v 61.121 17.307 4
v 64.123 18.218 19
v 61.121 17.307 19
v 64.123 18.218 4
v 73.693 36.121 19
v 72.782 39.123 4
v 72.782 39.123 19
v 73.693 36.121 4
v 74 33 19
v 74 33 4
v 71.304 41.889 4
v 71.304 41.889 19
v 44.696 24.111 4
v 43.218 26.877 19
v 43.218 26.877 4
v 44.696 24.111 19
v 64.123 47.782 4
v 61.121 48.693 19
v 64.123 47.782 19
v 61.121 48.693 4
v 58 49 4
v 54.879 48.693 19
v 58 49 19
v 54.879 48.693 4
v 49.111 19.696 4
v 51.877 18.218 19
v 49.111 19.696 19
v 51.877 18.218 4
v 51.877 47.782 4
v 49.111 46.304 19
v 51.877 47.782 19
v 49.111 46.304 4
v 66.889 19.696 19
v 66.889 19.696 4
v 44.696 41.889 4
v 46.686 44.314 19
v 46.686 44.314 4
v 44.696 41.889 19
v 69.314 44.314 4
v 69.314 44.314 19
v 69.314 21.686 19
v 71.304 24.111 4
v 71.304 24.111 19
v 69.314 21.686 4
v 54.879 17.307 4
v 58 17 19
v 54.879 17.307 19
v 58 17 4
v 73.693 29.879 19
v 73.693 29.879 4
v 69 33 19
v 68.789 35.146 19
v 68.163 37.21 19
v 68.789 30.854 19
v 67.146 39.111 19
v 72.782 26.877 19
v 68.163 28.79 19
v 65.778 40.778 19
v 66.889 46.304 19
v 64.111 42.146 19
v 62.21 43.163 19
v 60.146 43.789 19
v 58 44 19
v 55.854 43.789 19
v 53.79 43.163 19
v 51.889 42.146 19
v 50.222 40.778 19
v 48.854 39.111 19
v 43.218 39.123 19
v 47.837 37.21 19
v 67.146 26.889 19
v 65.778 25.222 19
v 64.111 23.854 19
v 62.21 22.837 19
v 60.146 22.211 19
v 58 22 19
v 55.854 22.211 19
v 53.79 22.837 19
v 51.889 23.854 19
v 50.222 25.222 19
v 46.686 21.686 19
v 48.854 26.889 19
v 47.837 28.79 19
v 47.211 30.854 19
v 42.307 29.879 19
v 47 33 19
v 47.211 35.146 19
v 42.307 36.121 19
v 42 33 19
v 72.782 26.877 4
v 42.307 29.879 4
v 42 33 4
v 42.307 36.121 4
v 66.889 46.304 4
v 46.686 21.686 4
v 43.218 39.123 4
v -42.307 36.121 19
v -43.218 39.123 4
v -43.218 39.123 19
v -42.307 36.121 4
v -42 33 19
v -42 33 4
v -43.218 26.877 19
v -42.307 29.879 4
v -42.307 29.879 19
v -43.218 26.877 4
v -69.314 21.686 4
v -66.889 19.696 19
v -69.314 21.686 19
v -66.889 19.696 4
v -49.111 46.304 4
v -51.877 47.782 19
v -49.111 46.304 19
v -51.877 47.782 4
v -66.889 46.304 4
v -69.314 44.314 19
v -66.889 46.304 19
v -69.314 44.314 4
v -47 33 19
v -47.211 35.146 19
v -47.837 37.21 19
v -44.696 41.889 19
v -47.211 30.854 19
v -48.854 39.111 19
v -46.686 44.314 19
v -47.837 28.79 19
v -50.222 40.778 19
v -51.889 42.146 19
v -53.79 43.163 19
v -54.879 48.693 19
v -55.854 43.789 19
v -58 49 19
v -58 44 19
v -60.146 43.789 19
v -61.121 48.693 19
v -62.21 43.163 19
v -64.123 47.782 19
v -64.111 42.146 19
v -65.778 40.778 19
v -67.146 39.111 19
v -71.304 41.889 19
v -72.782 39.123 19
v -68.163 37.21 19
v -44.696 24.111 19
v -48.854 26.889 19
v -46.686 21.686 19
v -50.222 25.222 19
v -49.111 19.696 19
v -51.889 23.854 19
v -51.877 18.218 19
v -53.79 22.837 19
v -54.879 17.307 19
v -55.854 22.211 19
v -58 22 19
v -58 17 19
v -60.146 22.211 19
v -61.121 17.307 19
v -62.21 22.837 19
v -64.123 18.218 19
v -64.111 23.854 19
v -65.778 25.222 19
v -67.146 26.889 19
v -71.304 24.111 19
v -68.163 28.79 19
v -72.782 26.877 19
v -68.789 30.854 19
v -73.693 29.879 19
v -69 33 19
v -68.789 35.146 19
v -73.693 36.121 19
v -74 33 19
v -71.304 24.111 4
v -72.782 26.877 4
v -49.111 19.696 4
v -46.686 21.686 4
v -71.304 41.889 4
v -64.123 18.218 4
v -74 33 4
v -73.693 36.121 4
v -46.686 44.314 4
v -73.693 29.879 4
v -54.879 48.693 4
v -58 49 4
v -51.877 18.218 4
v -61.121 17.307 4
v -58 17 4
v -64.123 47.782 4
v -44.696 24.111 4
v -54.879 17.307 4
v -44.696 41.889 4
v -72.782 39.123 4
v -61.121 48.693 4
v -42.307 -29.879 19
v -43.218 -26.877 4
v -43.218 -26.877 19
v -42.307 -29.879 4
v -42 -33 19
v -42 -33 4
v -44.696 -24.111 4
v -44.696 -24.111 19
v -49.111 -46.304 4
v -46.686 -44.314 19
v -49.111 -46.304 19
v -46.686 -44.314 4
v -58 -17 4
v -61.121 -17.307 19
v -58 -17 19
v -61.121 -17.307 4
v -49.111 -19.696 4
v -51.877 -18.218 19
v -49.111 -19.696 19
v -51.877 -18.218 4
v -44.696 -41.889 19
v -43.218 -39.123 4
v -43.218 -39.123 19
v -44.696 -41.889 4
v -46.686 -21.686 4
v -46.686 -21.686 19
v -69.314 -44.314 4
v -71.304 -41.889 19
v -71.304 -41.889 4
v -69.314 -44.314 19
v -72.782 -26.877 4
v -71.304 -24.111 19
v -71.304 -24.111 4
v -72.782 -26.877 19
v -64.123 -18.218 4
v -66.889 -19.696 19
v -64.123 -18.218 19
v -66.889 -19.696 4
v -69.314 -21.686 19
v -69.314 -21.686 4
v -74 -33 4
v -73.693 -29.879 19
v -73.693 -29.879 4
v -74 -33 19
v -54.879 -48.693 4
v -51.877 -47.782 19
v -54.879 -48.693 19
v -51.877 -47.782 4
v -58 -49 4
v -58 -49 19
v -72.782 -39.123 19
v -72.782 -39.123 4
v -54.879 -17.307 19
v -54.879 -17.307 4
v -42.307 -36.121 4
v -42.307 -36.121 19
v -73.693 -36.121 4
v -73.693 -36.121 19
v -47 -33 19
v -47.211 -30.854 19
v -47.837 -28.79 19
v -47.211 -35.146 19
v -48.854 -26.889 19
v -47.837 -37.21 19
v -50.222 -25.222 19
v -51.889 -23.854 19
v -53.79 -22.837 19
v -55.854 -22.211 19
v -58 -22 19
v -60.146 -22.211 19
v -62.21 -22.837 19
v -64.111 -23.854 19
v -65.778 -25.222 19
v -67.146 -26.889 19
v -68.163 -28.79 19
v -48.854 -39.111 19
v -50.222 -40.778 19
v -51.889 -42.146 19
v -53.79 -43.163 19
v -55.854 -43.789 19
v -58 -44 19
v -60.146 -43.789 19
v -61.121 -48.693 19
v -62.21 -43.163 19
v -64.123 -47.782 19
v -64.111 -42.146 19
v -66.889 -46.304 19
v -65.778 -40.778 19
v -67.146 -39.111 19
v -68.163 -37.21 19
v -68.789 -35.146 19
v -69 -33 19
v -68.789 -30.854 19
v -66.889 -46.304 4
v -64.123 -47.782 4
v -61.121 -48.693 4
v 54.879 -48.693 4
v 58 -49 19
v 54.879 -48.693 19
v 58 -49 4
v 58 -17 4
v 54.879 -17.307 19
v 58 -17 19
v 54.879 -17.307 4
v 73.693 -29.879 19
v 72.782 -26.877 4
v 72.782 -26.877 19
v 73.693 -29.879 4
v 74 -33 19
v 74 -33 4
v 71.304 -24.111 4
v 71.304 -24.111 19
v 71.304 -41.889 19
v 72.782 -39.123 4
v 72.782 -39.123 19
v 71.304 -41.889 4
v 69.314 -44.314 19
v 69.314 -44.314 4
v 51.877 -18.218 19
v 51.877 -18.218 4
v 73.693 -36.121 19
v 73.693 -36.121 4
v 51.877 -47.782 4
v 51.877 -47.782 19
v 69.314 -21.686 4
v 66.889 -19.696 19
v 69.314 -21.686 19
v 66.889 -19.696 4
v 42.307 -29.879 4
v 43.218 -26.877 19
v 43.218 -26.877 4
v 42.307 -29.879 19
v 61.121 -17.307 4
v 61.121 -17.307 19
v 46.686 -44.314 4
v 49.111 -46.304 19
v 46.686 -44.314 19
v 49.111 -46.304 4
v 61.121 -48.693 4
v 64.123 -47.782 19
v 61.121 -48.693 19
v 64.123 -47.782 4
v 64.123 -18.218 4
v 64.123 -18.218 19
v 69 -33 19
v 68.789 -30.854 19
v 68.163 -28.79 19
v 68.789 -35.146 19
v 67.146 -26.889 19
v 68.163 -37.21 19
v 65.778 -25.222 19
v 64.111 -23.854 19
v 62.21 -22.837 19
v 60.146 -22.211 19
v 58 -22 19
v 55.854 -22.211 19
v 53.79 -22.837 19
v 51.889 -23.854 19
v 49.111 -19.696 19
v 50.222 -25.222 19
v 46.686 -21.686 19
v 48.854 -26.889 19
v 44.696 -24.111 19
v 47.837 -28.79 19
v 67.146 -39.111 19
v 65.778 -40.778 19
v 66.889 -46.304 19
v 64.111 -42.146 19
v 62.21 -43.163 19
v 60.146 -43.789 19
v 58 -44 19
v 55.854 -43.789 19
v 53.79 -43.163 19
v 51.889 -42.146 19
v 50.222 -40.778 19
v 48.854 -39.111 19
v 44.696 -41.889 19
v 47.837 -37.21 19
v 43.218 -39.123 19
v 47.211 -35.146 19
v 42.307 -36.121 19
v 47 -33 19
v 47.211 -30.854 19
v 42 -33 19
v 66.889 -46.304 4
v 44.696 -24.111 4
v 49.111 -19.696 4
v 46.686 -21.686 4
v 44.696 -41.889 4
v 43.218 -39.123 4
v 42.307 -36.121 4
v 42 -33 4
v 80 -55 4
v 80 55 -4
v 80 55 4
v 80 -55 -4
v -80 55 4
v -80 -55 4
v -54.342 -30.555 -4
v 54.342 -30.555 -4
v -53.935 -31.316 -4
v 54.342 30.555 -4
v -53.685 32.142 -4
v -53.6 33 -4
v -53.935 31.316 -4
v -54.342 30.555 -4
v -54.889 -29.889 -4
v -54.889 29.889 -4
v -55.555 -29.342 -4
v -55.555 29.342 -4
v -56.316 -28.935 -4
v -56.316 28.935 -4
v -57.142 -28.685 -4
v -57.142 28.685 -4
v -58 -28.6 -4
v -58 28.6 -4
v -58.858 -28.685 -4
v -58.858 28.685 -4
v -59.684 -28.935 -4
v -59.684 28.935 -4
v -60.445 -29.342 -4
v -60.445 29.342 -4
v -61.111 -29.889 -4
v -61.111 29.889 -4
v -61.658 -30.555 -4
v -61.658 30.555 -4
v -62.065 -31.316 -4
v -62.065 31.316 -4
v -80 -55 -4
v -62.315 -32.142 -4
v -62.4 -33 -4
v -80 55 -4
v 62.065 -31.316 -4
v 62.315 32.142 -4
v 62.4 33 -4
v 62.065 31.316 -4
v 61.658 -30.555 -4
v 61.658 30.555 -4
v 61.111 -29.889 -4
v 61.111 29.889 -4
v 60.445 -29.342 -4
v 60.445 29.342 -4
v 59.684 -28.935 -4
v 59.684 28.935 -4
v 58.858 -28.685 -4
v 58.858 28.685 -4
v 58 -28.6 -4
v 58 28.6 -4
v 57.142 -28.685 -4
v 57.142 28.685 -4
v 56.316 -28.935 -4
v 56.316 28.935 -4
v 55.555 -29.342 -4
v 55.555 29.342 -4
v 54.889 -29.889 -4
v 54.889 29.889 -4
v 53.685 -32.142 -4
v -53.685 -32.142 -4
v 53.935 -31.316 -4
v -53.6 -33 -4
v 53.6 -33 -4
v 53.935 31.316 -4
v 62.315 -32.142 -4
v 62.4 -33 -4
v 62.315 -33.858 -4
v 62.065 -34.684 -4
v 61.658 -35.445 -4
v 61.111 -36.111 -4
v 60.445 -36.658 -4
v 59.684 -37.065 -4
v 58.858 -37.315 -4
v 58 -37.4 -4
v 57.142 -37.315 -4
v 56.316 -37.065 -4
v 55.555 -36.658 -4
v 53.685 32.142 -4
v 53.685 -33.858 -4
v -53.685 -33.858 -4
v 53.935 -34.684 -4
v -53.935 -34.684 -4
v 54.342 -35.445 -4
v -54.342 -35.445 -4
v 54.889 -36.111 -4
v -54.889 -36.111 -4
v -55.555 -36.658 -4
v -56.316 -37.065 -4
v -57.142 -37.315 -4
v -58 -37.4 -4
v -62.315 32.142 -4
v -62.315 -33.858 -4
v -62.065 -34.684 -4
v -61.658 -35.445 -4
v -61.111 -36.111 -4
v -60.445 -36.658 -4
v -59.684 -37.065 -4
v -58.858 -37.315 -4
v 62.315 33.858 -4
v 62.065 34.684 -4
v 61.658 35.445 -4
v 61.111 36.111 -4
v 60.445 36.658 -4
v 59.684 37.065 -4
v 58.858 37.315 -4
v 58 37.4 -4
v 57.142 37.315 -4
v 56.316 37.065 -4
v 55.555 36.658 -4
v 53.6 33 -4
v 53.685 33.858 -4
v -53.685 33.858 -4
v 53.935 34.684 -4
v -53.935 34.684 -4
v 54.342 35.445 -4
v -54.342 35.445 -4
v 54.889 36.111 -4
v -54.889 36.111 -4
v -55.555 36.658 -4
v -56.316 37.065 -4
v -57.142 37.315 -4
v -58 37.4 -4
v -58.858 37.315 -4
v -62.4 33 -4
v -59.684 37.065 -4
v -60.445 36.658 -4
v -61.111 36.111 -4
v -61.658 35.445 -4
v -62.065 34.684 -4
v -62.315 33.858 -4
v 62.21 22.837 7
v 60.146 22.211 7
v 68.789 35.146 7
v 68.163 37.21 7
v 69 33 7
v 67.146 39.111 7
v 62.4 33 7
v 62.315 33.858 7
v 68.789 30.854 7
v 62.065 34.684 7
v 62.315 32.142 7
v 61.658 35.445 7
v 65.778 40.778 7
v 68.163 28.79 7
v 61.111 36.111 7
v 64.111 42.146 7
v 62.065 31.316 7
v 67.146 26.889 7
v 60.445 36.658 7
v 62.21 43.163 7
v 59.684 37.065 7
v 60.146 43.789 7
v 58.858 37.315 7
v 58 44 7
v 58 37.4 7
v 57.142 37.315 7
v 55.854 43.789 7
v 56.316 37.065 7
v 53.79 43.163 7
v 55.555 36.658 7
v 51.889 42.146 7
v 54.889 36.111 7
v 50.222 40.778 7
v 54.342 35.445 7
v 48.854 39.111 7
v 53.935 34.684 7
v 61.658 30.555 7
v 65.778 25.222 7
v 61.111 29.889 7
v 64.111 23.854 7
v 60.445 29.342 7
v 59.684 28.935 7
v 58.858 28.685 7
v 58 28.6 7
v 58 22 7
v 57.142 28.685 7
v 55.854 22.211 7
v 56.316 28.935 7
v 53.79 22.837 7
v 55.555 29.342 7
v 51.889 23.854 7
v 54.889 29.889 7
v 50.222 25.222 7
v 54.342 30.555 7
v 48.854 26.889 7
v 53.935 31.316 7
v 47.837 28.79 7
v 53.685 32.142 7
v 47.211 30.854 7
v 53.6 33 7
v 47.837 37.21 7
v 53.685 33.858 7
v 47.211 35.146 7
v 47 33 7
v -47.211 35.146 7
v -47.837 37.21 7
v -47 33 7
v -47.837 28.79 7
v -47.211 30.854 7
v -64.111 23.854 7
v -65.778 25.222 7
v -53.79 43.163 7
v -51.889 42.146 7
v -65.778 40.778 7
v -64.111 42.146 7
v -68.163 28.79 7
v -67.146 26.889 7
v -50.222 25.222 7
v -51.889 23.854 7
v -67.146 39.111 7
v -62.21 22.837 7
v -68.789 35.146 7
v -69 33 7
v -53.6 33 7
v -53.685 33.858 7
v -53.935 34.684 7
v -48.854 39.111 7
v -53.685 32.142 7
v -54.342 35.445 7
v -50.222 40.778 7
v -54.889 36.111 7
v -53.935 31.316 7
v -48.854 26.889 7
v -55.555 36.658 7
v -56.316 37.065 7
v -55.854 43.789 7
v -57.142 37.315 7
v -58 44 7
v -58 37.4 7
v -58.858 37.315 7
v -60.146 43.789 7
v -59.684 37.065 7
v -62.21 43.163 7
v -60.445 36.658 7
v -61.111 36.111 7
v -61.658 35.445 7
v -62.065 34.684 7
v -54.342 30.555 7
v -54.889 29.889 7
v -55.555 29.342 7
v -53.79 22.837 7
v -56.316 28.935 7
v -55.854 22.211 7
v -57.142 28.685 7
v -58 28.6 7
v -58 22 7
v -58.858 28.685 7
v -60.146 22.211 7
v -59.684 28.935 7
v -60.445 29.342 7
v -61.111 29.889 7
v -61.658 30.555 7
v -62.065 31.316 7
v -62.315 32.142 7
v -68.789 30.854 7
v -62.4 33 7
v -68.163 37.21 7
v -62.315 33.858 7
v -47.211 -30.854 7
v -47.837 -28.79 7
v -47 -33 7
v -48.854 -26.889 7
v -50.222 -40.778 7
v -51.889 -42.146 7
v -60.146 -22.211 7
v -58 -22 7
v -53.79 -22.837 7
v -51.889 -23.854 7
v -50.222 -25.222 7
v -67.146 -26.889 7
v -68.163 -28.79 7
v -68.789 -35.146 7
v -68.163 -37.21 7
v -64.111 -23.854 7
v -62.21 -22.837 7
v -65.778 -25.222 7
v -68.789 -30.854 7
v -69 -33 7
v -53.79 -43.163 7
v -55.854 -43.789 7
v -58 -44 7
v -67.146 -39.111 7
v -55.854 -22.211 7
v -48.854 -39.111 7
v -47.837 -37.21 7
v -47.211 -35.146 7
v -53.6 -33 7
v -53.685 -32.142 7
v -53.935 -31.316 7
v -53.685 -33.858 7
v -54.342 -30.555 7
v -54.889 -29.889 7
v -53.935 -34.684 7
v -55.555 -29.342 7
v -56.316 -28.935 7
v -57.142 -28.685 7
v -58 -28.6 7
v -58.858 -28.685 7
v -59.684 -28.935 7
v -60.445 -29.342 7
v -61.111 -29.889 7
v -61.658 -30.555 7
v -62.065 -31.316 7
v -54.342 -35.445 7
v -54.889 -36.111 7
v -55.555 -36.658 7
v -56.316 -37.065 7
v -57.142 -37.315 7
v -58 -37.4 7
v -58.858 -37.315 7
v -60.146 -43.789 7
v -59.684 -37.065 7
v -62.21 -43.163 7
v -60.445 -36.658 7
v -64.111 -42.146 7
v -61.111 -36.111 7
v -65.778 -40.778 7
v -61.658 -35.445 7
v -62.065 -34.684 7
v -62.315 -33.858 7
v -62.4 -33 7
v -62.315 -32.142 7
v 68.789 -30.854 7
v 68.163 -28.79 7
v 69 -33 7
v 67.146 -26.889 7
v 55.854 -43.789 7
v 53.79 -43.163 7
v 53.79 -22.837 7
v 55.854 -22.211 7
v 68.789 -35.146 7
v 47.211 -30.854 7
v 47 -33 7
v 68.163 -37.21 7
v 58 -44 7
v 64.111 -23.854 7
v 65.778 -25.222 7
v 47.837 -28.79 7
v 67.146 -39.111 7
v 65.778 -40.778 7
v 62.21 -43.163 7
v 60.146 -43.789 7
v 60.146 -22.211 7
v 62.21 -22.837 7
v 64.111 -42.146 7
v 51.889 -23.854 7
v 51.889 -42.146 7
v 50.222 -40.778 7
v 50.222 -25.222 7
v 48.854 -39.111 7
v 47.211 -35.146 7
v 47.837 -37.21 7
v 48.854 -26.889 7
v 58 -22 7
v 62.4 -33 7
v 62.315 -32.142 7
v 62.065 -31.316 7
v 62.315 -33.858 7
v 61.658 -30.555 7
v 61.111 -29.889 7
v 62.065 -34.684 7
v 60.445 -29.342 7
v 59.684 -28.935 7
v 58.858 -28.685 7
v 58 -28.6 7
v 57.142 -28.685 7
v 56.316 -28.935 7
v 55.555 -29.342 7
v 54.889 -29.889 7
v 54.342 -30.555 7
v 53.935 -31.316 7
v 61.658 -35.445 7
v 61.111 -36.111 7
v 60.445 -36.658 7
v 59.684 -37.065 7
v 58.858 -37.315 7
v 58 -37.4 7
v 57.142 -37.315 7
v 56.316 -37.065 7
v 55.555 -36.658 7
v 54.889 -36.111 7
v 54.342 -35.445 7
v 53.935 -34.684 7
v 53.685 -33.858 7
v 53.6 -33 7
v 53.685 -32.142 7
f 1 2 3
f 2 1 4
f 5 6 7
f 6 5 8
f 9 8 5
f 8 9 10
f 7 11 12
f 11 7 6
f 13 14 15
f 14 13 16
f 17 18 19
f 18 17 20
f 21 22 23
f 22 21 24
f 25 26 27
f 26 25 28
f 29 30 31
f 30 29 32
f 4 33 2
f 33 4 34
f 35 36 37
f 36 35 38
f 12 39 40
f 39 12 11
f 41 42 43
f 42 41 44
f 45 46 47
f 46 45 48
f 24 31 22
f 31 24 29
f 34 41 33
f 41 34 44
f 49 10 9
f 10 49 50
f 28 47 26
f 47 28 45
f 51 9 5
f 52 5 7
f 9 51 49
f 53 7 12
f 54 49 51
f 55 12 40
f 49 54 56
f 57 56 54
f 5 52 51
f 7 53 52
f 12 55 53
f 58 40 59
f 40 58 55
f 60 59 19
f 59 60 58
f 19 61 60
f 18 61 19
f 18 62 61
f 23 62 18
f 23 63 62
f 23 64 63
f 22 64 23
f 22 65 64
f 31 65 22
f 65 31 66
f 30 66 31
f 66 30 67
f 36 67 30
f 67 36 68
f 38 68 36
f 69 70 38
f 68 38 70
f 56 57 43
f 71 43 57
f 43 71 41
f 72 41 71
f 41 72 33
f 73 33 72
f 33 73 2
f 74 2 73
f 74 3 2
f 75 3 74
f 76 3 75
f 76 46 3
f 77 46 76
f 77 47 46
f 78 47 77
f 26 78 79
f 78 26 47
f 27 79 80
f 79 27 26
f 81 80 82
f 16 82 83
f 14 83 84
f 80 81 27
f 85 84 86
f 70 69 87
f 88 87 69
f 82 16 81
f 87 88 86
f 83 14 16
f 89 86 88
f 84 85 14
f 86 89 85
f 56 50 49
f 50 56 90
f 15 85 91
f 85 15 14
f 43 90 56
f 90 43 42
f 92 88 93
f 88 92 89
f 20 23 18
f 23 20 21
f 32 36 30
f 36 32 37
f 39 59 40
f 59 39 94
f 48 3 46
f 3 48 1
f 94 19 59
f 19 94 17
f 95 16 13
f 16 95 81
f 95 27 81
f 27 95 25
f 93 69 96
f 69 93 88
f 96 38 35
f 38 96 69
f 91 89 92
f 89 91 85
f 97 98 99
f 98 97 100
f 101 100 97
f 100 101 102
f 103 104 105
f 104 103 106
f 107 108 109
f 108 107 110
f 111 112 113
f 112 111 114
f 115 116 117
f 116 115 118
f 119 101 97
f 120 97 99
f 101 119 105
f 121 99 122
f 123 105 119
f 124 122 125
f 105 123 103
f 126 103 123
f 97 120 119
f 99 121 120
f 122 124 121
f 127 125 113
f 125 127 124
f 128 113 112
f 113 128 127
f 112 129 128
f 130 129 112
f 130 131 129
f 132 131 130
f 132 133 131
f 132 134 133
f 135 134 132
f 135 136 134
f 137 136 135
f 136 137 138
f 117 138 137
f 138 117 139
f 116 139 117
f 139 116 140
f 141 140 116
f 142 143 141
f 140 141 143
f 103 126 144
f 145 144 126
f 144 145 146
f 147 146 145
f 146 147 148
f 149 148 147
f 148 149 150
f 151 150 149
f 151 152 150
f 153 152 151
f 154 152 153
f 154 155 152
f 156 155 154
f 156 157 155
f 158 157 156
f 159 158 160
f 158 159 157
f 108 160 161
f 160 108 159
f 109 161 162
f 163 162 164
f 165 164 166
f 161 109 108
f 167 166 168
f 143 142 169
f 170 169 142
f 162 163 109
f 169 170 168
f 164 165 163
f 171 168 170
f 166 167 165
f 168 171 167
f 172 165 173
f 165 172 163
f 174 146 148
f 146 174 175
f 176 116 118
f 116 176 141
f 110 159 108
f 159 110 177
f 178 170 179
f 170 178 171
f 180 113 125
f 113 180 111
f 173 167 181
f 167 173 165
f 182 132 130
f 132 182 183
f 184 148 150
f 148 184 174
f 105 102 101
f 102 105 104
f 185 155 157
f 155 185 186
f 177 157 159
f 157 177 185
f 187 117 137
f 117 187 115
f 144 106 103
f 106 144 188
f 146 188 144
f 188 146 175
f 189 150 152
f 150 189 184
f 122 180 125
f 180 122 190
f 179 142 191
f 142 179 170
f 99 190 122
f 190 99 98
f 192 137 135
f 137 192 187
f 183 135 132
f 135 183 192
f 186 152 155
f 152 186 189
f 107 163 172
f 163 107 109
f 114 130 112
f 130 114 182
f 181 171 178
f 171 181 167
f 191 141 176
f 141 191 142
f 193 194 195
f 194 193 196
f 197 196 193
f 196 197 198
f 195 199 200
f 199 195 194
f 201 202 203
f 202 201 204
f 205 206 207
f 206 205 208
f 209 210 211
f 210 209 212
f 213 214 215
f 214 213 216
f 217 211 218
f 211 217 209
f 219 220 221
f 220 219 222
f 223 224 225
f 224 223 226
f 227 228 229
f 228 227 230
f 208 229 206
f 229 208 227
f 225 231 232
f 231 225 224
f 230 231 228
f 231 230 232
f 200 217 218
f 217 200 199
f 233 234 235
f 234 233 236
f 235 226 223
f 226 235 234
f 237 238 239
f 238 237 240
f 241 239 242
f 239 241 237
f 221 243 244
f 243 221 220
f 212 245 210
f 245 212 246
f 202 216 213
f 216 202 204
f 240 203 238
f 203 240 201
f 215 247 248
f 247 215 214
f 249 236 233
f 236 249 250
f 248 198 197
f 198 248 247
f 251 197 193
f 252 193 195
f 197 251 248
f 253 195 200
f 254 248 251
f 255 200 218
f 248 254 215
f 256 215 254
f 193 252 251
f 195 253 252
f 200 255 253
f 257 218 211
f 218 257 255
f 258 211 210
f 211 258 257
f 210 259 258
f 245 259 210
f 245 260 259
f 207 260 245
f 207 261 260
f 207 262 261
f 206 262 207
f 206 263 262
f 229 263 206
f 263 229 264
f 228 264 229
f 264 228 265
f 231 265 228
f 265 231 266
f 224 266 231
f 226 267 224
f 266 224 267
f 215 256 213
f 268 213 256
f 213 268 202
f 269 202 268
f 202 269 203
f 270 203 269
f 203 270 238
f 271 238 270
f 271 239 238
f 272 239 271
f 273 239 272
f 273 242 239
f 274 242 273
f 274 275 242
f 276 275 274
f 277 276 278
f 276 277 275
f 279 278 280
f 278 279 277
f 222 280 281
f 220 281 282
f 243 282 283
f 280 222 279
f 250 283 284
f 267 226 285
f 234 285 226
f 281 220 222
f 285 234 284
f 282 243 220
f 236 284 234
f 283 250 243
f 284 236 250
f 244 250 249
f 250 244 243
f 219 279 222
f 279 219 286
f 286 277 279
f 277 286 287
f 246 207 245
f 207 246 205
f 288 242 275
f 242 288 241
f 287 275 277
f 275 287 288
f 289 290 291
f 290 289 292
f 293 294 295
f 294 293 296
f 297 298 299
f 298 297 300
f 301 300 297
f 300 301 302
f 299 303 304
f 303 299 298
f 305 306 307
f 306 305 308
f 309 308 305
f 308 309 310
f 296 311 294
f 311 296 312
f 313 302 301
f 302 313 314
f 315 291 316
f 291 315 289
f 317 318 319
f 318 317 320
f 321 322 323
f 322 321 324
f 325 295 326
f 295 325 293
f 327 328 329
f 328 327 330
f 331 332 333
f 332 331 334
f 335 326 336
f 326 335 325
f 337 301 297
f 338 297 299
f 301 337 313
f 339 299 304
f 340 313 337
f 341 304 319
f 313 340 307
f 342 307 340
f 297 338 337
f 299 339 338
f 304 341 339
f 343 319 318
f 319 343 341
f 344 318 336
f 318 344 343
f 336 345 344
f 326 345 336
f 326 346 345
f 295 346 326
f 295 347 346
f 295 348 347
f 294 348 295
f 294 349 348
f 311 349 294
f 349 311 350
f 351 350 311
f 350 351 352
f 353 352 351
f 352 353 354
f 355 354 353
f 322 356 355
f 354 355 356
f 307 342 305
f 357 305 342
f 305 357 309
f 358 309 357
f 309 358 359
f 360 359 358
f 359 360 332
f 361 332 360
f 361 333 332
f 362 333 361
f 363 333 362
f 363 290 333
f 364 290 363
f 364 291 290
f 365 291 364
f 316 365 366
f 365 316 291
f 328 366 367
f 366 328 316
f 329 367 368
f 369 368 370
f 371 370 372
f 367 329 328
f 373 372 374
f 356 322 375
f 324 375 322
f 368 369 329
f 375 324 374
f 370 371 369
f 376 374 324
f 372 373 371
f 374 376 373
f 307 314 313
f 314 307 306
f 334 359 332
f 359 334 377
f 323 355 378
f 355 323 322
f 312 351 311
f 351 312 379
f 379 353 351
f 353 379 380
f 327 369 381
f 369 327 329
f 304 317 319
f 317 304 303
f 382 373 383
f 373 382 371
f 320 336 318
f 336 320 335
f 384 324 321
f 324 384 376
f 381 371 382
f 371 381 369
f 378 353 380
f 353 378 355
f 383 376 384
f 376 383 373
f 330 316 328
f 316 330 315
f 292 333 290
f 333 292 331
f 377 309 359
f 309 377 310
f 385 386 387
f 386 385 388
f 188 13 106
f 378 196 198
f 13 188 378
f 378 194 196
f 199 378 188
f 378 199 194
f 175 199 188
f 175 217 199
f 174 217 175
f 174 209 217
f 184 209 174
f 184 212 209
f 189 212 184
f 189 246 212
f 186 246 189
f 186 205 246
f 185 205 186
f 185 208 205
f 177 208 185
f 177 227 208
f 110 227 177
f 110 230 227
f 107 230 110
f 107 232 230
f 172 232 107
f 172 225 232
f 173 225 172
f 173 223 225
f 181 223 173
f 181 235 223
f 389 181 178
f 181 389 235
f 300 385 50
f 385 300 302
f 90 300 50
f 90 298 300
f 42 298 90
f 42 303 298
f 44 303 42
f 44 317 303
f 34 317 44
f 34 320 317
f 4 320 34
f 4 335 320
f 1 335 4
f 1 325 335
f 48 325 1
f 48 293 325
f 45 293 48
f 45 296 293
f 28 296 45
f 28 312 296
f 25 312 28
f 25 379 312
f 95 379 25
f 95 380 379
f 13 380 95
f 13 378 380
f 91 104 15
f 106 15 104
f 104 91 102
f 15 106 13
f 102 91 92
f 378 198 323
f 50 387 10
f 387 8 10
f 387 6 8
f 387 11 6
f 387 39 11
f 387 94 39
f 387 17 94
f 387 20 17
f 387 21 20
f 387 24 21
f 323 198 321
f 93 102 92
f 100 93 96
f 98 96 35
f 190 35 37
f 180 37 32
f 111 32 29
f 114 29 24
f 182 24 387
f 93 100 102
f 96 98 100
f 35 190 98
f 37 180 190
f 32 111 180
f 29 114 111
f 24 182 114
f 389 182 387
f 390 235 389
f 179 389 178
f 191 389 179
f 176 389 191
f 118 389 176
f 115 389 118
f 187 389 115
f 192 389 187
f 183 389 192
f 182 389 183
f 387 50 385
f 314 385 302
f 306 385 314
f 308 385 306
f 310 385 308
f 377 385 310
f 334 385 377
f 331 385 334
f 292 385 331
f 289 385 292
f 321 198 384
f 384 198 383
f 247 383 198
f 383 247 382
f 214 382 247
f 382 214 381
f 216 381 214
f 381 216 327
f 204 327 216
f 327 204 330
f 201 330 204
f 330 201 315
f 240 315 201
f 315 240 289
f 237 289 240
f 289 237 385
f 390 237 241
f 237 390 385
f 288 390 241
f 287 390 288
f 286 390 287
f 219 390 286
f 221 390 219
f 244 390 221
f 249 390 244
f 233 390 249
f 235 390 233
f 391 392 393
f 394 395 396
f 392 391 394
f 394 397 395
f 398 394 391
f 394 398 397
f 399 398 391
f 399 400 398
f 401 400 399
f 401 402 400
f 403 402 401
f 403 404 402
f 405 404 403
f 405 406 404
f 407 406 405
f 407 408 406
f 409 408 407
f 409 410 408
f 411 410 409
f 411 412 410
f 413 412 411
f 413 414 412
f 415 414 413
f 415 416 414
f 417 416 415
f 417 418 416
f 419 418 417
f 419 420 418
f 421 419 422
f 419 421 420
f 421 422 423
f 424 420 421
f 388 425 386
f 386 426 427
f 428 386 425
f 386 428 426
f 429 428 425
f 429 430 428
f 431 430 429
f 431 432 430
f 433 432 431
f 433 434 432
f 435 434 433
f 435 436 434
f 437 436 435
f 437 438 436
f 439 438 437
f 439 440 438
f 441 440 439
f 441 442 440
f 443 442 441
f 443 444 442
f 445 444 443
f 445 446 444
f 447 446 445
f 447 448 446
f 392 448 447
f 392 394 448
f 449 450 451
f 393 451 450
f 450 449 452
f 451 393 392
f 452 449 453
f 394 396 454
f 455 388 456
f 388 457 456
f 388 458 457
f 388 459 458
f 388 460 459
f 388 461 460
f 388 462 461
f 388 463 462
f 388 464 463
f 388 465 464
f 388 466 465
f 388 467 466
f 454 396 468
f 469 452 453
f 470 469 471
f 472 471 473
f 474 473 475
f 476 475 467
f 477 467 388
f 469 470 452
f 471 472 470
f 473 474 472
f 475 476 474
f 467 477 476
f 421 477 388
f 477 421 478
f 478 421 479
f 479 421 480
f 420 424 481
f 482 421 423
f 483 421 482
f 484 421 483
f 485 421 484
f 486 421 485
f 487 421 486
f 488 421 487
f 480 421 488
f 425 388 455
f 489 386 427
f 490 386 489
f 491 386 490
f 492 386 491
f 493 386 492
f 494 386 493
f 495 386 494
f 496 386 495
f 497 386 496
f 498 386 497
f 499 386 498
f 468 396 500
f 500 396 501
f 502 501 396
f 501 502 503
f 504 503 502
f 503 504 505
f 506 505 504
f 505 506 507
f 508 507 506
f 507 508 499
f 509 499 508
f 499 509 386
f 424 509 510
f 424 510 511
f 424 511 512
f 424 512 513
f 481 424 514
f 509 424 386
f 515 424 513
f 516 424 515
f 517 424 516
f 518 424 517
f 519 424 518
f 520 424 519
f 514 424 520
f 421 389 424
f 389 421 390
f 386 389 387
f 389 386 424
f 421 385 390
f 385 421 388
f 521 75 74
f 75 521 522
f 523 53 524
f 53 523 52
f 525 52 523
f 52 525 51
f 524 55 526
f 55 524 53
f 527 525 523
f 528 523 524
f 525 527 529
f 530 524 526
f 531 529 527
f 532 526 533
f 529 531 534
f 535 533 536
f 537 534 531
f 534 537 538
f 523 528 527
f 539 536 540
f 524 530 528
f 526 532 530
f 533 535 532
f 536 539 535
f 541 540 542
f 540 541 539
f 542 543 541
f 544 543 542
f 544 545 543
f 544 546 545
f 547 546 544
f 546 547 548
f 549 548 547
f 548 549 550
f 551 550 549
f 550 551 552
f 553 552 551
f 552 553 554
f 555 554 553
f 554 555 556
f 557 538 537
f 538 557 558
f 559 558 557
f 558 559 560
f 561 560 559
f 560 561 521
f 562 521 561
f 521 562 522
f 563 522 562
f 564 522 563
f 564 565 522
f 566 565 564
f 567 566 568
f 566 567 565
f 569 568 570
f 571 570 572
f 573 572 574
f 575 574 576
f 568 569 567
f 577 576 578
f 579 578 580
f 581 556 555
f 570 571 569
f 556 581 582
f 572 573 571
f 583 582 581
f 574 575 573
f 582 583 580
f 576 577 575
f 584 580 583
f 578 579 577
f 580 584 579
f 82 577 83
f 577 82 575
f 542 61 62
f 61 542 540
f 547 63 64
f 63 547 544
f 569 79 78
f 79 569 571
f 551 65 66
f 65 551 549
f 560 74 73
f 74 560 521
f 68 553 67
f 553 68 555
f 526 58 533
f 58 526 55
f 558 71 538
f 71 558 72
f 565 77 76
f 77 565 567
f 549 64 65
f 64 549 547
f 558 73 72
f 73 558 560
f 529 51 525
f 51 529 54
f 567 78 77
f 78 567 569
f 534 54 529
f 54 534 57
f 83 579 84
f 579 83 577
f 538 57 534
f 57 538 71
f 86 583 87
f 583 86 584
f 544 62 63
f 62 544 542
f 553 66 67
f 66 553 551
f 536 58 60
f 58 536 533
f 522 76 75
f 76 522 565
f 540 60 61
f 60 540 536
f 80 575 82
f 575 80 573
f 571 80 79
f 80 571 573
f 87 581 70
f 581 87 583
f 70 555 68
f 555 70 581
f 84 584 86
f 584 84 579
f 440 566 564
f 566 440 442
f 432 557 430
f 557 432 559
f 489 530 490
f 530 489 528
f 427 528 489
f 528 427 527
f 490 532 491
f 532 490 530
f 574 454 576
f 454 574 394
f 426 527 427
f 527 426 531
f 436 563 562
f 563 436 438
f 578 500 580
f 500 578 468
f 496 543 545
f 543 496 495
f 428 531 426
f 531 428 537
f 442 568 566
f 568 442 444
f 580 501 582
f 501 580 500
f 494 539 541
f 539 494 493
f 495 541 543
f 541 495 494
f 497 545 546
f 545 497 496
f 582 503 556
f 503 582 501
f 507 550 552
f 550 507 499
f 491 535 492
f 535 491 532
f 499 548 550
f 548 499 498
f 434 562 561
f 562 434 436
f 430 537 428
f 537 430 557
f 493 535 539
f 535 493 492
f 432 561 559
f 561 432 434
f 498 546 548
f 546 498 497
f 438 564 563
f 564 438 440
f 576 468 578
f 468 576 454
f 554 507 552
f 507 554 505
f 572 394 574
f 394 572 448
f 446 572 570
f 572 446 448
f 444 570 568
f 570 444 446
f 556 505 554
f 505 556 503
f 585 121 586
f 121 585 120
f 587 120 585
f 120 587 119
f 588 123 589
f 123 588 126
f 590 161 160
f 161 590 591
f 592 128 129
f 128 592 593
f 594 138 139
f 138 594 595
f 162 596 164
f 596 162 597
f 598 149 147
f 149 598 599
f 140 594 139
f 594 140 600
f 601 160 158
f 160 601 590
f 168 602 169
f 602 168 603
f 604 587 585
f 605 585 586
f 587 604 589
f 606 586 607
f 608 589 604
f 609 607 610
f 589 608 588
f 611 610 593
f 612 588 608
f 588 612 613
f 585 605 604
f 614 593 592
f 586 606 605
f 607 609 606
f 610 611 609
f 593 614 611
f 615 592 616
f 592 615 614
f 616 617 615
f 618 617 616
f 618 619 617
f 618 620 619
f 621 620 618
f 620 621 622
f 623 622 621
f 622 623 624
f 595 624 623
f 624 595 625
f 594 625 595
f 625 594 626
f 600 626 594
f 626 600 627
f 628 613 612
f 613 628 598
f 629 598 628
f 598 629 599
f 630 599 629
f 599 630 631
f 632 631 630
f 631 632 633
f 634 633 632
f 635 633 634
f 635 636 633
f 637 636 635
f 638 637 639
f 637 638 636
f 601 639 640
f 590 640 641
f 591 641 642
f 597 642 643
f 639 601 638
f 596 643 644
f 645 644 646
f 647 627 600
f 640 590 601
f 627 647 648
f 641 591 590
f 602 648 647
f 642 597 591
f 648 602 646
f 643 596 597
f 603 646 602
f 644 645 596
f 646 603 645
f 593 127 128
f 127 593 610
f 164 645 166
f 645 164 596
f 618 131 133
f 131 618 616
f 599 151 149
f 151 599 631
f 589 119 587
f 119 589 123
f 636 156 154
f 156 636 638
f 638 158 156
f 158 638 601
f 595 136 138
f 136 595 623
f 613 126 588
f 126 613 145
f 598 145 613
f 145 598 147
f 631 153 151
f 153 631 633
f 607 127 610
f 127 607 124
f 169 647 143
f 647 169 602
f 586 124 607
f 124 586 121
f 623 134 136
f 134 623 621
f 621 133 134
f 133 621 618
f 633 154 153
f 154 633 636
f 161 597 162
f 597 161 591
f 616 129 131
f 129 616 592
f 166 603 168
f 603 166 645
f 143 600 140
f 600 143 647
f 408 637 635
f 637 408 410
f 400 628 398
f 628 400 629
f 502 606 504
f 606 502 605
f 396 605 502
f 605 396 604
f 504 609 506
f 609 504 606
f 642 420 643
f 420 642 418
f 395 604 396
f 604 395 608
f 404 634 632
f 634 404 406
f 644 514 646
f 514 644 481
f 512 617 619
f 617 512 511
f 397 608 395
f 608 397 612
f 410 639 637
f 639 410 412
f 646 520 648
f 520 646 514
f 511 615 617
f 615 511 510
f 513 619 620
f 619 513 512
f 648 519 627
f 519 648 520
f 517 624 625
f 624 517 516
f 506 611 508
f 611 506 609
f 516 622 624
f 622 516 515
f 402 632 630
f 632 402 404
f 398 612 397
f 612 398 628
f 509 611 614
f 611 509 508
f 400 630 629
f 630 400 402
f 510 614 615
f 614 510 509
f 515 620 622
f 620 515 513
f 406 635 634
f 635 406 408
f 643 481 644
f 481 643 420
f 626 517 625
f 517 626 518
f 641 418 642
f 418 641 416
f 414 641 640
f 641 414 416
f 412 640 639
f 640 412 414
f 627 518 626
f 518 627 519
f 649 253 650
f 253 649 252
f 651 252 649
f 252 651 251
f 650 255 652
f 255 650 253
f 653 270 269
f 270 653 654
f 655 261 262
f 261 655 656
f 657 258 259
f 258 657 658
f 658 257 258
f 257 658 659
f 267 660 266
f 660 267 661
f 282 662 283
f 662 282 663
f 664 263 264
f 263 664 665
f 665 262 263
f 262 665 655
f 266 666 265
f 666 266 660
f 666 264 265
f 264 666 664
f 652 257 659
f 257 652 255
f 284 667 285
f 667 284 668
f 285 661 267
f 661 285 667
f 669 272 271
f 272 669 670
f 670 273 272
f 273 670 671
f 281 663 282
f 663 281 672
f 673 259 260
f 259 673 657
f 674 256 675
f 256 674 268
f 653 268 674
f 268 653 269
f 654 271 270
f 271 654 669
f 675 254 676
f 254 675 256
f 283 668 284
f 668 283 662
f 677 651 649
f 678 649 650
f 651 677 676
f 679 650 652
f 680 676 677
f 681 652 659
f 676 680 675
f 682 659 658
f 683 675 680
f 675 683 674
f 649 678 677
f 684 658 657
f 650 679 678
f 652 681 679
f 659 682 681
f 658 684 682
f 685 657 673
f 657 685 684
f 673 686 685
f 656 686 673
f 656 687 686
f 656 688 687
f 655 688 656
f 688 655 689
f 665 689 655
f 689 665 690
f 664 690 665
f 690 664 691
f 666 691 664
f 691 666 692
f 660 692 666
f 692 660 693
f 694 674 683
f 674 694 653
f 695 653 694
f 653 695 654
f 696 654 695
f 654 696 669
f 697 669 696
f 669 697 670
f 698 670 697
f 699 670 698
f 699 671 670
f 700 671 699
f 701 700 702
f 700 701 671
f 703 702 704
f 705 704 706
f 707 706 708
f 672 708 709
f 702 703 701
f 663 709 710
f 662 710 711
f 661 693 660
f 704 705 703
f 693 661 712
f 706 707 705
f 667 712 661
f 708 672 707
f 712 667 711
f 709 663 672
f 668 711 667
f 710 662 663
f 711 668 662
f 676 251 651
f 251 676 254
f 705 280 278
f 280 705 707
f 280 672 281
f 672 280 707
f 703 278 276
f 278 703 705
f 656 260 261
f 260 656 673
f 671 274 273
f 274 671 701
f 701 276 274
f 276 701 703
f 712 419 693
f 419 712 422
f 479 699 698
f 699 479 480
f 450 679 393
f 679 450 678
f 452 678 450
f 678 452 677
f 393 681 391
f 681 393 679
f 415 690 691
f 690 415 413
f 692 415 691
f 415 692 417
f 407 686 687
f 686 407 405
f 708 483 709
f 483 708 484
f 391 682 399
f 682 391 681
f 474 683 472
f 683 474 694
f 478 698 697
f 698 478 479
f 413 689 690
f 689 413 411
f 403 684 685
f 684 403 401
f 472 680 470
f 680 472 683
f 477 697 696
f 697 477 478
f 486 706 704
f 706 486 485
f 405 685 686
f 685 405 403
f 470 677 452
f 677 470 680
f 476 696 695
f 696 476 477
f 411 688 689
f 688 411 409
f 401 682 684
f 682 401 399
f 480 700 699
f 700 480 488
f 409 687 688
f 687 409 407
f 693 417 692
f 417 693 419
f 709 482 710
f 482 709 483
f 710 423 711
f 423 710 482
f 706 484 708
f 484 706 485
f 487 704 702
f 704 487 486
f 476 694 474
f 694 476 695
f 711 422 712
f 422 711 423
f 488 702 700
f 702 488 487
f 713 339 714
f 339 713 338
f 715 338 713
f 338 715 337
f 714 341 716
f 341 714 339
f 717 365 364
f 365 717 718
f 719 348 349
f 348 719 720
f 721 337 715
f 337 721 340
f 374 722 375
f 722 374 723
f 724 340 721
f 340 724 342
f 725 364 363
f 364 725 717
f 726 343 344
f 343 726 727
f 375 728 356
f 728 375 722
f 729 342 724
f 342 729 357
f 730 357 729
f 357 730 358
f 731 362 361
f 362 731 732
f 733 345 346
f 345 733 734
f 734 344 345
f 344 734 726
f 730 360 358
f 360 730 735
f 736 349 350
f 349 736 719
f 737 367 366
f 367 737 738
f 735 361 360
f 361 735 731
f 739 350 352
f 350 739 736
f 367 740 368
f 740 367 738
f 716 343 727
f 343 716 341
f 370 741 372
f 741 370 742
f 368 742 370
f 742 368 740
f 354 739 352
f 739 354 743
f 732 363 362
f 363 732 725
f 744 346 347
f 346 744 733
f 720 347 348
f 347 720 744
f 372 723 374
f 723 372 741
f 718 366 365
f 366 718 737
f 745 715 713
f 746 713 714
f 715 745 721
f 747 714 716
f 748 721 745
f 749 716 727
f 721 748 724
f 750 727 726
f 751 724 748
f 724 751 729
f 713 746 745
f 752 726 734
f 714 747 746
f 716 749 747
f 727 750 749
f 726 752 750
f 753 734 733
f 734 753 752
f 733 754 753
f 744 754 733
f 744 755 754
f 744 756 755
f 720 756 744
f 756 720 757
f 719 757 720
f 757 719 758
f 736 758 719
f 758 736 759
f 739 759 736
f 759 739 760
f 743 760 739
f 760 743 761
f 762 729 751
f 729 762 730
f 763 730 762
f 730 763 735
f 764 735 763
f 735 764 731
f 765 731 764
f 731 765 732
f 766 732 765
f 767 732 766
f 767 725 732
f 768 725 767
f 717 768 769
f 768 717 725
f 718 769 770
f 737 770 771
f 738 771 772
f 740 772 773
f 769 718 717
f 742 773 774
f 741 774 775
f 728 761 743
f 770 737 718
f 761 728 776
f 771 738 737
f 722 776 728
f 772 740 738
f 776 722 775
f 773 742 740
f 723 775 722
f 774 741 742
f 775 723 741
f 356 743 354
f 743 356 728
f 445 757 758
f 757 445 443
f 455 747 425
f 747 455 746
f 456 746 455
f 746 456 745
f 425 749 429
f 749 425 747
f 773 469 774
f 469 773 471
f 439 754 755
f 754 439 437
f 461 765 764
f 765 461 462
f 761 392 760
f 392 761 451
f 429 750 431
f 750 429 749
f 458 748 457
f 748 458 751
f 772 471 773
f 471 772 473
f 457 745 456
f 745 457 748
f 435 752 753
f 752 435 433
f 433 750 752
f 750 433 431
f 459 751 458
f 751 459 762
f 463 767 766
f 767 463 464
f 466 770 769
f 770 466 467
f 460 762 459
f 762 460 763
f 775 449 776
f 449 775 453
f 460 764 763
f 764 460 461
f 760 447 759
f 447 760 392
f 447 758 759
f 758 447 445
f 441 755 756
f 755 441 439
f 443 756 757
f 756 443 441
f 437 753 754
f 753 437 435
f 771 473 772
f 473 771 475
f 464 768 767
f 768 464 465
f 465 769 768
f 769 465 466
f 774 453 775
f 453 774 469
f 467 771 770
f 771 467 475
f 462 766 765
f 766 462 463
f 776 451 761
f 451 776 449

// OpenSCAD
$fn = 32;

// ----------------------------------------------------------------------
// Socket pad plate
// bosses with counterbored sockets for the screws
// ----------------------------------------------------------------------

// --- parameters (mm) ---
base_t = 8;             // base plate thickness
boss_h = 15;            // boss height above the base plate
boss_d = 32;            // boss diameter
socket_d = 22;          // socket diameter
socket_depth = 12;      // socket depth from the boss face
bolt_d = 8.8;           // screw clearance hole through the socket floor
plate = [160, 110, 8];  // overall size (x, y, z)
edge = 22;              // boss centre offset from the plate edge
pads = 4;               // boss count, one per corner

// --- derived feature positions (mm) ---
height = base_t + boss_h;        // = 23   overall height of the part
corner_x = plate[0] / 2 - edge;  // = 58   boss centre X
corner_y = plate[1] / 2 - edge;  // = 33   boss centre Y
feature_centers = [
  [corner_x, corner_y],
  [-corner_x, corner_y],
  [-corner_x, -corner_y],
  [corner_x, -corner_y]
];   // boss centres: sockets, holes and the pads themselves are placed from here

// base plate, bosses on feature_centers, socket + through hole in each
difference() {
  union() {
    cube(plate, center = true);
    for (centre = feature_centers)
      translate([centre[0], centre[1], plate[2] / 2 - 1])
        cylinder(d = boss_d, h = boss_h + 1);
  }
  for (centre = feature_centers) {
    translate([centre[0], centre[1], plate[2] / 2 + boss_h - socket_depth])
      cylinder(d = socket_d, h = socket_depth + 1);
    translate([centre[0], centre[1], -height])
      cylinder(d = bolt_d, h = 2 * height + 2);  // through the socket floor
  }
}
